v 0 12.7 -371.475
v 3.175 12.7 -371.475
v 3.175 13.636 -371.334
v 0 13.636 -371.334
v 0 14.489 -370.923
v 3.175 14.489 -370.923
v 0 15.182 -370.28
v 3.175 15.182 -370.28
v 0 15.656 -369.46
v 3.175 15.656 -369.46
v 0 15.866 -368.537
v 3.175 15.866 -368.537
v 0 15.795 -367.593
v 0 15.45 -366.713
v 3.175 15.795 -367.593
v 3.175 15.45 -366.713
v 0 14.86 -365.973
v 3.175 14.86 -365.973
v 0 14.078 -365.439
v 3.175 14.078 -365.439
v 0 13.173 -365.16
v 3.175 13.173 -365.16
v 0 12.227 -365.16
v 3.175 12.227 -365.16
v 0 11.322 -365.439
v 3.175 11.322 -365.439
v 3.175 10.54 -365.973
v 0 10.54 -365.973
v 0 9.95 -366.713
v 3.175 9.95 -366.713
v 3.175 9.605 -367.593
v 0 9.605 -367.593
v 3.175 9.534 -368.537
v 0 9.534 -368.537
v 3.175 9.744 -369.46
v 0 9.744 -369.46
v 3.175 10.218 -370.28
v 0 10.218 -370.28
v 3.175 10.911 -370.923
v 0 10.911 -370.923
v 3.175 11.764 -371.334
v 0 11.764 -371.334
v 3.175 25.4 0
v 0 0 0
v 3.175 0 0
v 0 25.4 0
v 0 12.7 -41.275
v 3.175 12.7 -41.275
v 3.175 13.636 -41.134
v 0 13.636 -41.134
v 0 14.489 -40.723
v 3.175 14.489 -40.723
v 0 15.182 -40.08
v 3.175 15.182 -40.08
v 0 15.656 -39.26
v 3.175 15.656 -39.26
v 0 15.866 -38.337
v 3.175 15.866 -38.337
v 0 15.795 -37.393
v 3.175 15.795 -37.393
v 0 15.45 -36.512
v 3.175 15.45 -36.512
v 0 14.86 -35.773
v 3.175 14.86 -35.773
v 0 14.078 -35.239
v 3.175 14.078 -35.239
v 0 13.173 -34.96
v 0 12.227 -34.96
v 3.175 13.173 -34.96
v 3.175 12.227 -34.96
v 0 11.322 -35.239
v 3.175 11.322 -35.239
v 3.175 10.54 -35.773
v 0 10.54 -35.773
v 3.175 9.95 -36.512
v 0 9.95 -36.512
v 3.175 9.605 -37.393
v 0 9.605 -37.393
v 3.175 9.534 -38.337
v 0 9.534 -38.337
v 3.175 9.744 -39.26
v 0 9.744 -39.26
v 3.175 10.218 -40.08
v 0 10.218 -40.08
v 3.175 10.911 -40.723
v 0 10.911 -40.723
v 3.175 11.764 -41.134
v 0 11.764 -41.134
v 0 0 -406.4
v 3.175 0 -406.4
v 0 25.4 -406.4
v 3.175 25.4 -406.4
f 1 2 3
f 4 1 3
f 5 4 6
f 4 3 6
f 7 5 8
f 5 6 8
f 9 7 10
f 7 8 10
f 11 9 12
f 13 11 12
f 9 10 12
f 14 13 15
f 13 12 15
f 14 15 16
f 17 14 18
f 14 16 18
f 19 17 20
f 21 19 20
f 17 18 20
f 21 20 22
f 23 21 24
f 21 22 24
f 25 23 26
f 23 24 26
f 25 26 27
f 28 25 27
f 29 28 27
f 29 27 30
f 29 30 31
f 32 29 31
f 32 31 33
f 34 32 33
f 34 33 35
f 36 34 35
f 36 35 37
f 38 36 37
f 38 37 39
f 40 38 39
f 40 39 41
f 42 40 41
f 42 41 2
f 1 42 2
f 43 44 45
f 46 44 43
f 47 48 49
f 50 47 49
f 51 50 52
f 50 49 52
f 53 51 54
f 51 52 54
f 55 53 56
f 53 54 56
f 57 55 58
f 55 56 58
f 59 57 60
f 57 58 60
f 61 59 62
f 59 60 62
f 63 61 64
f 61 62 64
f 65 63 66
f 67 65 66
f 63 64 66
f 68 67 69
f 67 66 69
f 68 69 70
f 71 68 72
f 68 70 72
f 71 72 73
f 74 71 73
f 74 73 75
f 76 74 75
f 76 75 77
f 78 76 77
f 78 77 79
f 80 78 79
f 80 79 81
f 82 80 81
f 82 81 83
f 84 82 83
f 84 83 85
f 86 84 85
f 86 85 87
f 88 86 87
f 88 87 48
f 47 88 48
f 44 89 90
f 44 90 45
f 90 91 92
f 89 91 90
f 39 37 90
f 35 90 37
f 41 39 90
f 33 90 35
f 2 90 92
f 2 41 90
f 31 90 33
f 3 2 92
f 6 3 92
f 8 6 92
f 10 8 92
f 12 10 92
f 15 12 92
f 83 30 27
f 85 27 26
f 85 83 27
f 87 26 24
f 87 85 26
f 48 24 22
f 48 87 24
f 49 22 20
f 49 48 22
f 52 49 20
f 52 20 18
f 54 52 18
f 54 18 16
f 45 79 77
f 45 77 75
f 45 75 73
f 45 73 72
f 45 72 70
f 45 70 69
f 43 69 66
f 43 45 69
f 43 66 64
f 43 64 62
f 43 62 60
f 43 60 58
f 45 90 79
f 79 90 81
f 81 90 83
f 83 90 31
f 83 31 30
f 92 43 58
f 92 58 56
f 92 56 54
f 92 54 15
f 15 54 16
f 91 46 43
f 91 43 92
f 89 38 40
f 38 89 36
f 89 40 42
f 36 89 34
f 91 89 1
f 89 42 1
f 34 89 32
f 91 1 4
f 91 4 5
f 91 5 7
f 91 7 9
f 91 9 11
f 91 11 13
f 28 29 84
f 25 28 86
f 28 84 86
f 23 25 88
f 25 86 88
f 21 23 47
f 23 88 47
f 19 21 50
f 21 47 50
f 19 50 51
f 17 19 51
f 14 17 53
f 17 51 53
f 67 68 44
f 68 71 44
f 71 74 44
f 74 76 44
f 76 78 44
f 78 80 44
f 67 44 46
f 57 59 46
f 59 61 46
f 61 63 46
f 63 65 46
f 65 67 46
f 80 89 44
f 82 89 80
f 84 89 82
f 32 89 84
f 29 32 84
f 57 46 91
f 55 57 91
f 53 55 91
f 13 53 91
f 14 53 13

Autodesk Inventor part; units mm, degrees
ref_plane "YZ Plane" through (0, 0, 0) normal (1, 0, 0) x (0, 1, 0)
ref_plane "XZ Plane" through (0, 0, 0) normal (0, 1, 0) x (-1, 0, 0)
ref_plane "XY Plane" through (0, 0, 0) normal (0, 0, 1) x (1, 0, 0)
sketch "Sketch1" plane through (0, 0, 0) normal (1, 0, 0) x (0, 1, 0)
  line L0 (0, 0) -> (25.4, 0)
  line L1 (25.4, 0) -> (25.4, -406.4)
  line L2 (25.4, -406.4) -> (0, -406.4)
  line L3 (0, -406.4) -> (0, 0)
  dimension "d0" = 25.4
  dimension "d1" = 406.4
extrude "Extrusion1" add sketch "Sketch1" along normal blind 3.175
sketch "Sketch2" plane through (3.175, 0, 0) normal (1, 0, 0) x (0, 0, -1)
  line L0 (0, 25.4) -> (0, 0) projected
  line L1 (406.4, 0) -> (406.4, 25.4) projected
  line L2 (406.4, 25.4) -> (0, 25.4) projected
  line L3 (0, 12.7) -> (38.1, 12.7)
  line L4 (0, 12.7) -> (38.1, 12.7) construction
  line L5 (406.4, 12.7) -> (368.3, 12.7)
  line L6 (406.4, 12.7) -> (444.5, 12.7) construction
  circle A0 centre (38.1, 12.7) radius 3.175
  circle A1 centre (368.3, 12.7) radius 3.175
  dimension "d4" = 38.1
  dimension "d5" = 0
  dimension "d6" = 38.1
  dimension "d7" = 180
  dimension "d8" = 6.35
  dimension "d9" = 6.35
extrude "Extrusion2" cut sketch "Sketch2" against normal blind 3.175
properties part number "CatchPlate"
